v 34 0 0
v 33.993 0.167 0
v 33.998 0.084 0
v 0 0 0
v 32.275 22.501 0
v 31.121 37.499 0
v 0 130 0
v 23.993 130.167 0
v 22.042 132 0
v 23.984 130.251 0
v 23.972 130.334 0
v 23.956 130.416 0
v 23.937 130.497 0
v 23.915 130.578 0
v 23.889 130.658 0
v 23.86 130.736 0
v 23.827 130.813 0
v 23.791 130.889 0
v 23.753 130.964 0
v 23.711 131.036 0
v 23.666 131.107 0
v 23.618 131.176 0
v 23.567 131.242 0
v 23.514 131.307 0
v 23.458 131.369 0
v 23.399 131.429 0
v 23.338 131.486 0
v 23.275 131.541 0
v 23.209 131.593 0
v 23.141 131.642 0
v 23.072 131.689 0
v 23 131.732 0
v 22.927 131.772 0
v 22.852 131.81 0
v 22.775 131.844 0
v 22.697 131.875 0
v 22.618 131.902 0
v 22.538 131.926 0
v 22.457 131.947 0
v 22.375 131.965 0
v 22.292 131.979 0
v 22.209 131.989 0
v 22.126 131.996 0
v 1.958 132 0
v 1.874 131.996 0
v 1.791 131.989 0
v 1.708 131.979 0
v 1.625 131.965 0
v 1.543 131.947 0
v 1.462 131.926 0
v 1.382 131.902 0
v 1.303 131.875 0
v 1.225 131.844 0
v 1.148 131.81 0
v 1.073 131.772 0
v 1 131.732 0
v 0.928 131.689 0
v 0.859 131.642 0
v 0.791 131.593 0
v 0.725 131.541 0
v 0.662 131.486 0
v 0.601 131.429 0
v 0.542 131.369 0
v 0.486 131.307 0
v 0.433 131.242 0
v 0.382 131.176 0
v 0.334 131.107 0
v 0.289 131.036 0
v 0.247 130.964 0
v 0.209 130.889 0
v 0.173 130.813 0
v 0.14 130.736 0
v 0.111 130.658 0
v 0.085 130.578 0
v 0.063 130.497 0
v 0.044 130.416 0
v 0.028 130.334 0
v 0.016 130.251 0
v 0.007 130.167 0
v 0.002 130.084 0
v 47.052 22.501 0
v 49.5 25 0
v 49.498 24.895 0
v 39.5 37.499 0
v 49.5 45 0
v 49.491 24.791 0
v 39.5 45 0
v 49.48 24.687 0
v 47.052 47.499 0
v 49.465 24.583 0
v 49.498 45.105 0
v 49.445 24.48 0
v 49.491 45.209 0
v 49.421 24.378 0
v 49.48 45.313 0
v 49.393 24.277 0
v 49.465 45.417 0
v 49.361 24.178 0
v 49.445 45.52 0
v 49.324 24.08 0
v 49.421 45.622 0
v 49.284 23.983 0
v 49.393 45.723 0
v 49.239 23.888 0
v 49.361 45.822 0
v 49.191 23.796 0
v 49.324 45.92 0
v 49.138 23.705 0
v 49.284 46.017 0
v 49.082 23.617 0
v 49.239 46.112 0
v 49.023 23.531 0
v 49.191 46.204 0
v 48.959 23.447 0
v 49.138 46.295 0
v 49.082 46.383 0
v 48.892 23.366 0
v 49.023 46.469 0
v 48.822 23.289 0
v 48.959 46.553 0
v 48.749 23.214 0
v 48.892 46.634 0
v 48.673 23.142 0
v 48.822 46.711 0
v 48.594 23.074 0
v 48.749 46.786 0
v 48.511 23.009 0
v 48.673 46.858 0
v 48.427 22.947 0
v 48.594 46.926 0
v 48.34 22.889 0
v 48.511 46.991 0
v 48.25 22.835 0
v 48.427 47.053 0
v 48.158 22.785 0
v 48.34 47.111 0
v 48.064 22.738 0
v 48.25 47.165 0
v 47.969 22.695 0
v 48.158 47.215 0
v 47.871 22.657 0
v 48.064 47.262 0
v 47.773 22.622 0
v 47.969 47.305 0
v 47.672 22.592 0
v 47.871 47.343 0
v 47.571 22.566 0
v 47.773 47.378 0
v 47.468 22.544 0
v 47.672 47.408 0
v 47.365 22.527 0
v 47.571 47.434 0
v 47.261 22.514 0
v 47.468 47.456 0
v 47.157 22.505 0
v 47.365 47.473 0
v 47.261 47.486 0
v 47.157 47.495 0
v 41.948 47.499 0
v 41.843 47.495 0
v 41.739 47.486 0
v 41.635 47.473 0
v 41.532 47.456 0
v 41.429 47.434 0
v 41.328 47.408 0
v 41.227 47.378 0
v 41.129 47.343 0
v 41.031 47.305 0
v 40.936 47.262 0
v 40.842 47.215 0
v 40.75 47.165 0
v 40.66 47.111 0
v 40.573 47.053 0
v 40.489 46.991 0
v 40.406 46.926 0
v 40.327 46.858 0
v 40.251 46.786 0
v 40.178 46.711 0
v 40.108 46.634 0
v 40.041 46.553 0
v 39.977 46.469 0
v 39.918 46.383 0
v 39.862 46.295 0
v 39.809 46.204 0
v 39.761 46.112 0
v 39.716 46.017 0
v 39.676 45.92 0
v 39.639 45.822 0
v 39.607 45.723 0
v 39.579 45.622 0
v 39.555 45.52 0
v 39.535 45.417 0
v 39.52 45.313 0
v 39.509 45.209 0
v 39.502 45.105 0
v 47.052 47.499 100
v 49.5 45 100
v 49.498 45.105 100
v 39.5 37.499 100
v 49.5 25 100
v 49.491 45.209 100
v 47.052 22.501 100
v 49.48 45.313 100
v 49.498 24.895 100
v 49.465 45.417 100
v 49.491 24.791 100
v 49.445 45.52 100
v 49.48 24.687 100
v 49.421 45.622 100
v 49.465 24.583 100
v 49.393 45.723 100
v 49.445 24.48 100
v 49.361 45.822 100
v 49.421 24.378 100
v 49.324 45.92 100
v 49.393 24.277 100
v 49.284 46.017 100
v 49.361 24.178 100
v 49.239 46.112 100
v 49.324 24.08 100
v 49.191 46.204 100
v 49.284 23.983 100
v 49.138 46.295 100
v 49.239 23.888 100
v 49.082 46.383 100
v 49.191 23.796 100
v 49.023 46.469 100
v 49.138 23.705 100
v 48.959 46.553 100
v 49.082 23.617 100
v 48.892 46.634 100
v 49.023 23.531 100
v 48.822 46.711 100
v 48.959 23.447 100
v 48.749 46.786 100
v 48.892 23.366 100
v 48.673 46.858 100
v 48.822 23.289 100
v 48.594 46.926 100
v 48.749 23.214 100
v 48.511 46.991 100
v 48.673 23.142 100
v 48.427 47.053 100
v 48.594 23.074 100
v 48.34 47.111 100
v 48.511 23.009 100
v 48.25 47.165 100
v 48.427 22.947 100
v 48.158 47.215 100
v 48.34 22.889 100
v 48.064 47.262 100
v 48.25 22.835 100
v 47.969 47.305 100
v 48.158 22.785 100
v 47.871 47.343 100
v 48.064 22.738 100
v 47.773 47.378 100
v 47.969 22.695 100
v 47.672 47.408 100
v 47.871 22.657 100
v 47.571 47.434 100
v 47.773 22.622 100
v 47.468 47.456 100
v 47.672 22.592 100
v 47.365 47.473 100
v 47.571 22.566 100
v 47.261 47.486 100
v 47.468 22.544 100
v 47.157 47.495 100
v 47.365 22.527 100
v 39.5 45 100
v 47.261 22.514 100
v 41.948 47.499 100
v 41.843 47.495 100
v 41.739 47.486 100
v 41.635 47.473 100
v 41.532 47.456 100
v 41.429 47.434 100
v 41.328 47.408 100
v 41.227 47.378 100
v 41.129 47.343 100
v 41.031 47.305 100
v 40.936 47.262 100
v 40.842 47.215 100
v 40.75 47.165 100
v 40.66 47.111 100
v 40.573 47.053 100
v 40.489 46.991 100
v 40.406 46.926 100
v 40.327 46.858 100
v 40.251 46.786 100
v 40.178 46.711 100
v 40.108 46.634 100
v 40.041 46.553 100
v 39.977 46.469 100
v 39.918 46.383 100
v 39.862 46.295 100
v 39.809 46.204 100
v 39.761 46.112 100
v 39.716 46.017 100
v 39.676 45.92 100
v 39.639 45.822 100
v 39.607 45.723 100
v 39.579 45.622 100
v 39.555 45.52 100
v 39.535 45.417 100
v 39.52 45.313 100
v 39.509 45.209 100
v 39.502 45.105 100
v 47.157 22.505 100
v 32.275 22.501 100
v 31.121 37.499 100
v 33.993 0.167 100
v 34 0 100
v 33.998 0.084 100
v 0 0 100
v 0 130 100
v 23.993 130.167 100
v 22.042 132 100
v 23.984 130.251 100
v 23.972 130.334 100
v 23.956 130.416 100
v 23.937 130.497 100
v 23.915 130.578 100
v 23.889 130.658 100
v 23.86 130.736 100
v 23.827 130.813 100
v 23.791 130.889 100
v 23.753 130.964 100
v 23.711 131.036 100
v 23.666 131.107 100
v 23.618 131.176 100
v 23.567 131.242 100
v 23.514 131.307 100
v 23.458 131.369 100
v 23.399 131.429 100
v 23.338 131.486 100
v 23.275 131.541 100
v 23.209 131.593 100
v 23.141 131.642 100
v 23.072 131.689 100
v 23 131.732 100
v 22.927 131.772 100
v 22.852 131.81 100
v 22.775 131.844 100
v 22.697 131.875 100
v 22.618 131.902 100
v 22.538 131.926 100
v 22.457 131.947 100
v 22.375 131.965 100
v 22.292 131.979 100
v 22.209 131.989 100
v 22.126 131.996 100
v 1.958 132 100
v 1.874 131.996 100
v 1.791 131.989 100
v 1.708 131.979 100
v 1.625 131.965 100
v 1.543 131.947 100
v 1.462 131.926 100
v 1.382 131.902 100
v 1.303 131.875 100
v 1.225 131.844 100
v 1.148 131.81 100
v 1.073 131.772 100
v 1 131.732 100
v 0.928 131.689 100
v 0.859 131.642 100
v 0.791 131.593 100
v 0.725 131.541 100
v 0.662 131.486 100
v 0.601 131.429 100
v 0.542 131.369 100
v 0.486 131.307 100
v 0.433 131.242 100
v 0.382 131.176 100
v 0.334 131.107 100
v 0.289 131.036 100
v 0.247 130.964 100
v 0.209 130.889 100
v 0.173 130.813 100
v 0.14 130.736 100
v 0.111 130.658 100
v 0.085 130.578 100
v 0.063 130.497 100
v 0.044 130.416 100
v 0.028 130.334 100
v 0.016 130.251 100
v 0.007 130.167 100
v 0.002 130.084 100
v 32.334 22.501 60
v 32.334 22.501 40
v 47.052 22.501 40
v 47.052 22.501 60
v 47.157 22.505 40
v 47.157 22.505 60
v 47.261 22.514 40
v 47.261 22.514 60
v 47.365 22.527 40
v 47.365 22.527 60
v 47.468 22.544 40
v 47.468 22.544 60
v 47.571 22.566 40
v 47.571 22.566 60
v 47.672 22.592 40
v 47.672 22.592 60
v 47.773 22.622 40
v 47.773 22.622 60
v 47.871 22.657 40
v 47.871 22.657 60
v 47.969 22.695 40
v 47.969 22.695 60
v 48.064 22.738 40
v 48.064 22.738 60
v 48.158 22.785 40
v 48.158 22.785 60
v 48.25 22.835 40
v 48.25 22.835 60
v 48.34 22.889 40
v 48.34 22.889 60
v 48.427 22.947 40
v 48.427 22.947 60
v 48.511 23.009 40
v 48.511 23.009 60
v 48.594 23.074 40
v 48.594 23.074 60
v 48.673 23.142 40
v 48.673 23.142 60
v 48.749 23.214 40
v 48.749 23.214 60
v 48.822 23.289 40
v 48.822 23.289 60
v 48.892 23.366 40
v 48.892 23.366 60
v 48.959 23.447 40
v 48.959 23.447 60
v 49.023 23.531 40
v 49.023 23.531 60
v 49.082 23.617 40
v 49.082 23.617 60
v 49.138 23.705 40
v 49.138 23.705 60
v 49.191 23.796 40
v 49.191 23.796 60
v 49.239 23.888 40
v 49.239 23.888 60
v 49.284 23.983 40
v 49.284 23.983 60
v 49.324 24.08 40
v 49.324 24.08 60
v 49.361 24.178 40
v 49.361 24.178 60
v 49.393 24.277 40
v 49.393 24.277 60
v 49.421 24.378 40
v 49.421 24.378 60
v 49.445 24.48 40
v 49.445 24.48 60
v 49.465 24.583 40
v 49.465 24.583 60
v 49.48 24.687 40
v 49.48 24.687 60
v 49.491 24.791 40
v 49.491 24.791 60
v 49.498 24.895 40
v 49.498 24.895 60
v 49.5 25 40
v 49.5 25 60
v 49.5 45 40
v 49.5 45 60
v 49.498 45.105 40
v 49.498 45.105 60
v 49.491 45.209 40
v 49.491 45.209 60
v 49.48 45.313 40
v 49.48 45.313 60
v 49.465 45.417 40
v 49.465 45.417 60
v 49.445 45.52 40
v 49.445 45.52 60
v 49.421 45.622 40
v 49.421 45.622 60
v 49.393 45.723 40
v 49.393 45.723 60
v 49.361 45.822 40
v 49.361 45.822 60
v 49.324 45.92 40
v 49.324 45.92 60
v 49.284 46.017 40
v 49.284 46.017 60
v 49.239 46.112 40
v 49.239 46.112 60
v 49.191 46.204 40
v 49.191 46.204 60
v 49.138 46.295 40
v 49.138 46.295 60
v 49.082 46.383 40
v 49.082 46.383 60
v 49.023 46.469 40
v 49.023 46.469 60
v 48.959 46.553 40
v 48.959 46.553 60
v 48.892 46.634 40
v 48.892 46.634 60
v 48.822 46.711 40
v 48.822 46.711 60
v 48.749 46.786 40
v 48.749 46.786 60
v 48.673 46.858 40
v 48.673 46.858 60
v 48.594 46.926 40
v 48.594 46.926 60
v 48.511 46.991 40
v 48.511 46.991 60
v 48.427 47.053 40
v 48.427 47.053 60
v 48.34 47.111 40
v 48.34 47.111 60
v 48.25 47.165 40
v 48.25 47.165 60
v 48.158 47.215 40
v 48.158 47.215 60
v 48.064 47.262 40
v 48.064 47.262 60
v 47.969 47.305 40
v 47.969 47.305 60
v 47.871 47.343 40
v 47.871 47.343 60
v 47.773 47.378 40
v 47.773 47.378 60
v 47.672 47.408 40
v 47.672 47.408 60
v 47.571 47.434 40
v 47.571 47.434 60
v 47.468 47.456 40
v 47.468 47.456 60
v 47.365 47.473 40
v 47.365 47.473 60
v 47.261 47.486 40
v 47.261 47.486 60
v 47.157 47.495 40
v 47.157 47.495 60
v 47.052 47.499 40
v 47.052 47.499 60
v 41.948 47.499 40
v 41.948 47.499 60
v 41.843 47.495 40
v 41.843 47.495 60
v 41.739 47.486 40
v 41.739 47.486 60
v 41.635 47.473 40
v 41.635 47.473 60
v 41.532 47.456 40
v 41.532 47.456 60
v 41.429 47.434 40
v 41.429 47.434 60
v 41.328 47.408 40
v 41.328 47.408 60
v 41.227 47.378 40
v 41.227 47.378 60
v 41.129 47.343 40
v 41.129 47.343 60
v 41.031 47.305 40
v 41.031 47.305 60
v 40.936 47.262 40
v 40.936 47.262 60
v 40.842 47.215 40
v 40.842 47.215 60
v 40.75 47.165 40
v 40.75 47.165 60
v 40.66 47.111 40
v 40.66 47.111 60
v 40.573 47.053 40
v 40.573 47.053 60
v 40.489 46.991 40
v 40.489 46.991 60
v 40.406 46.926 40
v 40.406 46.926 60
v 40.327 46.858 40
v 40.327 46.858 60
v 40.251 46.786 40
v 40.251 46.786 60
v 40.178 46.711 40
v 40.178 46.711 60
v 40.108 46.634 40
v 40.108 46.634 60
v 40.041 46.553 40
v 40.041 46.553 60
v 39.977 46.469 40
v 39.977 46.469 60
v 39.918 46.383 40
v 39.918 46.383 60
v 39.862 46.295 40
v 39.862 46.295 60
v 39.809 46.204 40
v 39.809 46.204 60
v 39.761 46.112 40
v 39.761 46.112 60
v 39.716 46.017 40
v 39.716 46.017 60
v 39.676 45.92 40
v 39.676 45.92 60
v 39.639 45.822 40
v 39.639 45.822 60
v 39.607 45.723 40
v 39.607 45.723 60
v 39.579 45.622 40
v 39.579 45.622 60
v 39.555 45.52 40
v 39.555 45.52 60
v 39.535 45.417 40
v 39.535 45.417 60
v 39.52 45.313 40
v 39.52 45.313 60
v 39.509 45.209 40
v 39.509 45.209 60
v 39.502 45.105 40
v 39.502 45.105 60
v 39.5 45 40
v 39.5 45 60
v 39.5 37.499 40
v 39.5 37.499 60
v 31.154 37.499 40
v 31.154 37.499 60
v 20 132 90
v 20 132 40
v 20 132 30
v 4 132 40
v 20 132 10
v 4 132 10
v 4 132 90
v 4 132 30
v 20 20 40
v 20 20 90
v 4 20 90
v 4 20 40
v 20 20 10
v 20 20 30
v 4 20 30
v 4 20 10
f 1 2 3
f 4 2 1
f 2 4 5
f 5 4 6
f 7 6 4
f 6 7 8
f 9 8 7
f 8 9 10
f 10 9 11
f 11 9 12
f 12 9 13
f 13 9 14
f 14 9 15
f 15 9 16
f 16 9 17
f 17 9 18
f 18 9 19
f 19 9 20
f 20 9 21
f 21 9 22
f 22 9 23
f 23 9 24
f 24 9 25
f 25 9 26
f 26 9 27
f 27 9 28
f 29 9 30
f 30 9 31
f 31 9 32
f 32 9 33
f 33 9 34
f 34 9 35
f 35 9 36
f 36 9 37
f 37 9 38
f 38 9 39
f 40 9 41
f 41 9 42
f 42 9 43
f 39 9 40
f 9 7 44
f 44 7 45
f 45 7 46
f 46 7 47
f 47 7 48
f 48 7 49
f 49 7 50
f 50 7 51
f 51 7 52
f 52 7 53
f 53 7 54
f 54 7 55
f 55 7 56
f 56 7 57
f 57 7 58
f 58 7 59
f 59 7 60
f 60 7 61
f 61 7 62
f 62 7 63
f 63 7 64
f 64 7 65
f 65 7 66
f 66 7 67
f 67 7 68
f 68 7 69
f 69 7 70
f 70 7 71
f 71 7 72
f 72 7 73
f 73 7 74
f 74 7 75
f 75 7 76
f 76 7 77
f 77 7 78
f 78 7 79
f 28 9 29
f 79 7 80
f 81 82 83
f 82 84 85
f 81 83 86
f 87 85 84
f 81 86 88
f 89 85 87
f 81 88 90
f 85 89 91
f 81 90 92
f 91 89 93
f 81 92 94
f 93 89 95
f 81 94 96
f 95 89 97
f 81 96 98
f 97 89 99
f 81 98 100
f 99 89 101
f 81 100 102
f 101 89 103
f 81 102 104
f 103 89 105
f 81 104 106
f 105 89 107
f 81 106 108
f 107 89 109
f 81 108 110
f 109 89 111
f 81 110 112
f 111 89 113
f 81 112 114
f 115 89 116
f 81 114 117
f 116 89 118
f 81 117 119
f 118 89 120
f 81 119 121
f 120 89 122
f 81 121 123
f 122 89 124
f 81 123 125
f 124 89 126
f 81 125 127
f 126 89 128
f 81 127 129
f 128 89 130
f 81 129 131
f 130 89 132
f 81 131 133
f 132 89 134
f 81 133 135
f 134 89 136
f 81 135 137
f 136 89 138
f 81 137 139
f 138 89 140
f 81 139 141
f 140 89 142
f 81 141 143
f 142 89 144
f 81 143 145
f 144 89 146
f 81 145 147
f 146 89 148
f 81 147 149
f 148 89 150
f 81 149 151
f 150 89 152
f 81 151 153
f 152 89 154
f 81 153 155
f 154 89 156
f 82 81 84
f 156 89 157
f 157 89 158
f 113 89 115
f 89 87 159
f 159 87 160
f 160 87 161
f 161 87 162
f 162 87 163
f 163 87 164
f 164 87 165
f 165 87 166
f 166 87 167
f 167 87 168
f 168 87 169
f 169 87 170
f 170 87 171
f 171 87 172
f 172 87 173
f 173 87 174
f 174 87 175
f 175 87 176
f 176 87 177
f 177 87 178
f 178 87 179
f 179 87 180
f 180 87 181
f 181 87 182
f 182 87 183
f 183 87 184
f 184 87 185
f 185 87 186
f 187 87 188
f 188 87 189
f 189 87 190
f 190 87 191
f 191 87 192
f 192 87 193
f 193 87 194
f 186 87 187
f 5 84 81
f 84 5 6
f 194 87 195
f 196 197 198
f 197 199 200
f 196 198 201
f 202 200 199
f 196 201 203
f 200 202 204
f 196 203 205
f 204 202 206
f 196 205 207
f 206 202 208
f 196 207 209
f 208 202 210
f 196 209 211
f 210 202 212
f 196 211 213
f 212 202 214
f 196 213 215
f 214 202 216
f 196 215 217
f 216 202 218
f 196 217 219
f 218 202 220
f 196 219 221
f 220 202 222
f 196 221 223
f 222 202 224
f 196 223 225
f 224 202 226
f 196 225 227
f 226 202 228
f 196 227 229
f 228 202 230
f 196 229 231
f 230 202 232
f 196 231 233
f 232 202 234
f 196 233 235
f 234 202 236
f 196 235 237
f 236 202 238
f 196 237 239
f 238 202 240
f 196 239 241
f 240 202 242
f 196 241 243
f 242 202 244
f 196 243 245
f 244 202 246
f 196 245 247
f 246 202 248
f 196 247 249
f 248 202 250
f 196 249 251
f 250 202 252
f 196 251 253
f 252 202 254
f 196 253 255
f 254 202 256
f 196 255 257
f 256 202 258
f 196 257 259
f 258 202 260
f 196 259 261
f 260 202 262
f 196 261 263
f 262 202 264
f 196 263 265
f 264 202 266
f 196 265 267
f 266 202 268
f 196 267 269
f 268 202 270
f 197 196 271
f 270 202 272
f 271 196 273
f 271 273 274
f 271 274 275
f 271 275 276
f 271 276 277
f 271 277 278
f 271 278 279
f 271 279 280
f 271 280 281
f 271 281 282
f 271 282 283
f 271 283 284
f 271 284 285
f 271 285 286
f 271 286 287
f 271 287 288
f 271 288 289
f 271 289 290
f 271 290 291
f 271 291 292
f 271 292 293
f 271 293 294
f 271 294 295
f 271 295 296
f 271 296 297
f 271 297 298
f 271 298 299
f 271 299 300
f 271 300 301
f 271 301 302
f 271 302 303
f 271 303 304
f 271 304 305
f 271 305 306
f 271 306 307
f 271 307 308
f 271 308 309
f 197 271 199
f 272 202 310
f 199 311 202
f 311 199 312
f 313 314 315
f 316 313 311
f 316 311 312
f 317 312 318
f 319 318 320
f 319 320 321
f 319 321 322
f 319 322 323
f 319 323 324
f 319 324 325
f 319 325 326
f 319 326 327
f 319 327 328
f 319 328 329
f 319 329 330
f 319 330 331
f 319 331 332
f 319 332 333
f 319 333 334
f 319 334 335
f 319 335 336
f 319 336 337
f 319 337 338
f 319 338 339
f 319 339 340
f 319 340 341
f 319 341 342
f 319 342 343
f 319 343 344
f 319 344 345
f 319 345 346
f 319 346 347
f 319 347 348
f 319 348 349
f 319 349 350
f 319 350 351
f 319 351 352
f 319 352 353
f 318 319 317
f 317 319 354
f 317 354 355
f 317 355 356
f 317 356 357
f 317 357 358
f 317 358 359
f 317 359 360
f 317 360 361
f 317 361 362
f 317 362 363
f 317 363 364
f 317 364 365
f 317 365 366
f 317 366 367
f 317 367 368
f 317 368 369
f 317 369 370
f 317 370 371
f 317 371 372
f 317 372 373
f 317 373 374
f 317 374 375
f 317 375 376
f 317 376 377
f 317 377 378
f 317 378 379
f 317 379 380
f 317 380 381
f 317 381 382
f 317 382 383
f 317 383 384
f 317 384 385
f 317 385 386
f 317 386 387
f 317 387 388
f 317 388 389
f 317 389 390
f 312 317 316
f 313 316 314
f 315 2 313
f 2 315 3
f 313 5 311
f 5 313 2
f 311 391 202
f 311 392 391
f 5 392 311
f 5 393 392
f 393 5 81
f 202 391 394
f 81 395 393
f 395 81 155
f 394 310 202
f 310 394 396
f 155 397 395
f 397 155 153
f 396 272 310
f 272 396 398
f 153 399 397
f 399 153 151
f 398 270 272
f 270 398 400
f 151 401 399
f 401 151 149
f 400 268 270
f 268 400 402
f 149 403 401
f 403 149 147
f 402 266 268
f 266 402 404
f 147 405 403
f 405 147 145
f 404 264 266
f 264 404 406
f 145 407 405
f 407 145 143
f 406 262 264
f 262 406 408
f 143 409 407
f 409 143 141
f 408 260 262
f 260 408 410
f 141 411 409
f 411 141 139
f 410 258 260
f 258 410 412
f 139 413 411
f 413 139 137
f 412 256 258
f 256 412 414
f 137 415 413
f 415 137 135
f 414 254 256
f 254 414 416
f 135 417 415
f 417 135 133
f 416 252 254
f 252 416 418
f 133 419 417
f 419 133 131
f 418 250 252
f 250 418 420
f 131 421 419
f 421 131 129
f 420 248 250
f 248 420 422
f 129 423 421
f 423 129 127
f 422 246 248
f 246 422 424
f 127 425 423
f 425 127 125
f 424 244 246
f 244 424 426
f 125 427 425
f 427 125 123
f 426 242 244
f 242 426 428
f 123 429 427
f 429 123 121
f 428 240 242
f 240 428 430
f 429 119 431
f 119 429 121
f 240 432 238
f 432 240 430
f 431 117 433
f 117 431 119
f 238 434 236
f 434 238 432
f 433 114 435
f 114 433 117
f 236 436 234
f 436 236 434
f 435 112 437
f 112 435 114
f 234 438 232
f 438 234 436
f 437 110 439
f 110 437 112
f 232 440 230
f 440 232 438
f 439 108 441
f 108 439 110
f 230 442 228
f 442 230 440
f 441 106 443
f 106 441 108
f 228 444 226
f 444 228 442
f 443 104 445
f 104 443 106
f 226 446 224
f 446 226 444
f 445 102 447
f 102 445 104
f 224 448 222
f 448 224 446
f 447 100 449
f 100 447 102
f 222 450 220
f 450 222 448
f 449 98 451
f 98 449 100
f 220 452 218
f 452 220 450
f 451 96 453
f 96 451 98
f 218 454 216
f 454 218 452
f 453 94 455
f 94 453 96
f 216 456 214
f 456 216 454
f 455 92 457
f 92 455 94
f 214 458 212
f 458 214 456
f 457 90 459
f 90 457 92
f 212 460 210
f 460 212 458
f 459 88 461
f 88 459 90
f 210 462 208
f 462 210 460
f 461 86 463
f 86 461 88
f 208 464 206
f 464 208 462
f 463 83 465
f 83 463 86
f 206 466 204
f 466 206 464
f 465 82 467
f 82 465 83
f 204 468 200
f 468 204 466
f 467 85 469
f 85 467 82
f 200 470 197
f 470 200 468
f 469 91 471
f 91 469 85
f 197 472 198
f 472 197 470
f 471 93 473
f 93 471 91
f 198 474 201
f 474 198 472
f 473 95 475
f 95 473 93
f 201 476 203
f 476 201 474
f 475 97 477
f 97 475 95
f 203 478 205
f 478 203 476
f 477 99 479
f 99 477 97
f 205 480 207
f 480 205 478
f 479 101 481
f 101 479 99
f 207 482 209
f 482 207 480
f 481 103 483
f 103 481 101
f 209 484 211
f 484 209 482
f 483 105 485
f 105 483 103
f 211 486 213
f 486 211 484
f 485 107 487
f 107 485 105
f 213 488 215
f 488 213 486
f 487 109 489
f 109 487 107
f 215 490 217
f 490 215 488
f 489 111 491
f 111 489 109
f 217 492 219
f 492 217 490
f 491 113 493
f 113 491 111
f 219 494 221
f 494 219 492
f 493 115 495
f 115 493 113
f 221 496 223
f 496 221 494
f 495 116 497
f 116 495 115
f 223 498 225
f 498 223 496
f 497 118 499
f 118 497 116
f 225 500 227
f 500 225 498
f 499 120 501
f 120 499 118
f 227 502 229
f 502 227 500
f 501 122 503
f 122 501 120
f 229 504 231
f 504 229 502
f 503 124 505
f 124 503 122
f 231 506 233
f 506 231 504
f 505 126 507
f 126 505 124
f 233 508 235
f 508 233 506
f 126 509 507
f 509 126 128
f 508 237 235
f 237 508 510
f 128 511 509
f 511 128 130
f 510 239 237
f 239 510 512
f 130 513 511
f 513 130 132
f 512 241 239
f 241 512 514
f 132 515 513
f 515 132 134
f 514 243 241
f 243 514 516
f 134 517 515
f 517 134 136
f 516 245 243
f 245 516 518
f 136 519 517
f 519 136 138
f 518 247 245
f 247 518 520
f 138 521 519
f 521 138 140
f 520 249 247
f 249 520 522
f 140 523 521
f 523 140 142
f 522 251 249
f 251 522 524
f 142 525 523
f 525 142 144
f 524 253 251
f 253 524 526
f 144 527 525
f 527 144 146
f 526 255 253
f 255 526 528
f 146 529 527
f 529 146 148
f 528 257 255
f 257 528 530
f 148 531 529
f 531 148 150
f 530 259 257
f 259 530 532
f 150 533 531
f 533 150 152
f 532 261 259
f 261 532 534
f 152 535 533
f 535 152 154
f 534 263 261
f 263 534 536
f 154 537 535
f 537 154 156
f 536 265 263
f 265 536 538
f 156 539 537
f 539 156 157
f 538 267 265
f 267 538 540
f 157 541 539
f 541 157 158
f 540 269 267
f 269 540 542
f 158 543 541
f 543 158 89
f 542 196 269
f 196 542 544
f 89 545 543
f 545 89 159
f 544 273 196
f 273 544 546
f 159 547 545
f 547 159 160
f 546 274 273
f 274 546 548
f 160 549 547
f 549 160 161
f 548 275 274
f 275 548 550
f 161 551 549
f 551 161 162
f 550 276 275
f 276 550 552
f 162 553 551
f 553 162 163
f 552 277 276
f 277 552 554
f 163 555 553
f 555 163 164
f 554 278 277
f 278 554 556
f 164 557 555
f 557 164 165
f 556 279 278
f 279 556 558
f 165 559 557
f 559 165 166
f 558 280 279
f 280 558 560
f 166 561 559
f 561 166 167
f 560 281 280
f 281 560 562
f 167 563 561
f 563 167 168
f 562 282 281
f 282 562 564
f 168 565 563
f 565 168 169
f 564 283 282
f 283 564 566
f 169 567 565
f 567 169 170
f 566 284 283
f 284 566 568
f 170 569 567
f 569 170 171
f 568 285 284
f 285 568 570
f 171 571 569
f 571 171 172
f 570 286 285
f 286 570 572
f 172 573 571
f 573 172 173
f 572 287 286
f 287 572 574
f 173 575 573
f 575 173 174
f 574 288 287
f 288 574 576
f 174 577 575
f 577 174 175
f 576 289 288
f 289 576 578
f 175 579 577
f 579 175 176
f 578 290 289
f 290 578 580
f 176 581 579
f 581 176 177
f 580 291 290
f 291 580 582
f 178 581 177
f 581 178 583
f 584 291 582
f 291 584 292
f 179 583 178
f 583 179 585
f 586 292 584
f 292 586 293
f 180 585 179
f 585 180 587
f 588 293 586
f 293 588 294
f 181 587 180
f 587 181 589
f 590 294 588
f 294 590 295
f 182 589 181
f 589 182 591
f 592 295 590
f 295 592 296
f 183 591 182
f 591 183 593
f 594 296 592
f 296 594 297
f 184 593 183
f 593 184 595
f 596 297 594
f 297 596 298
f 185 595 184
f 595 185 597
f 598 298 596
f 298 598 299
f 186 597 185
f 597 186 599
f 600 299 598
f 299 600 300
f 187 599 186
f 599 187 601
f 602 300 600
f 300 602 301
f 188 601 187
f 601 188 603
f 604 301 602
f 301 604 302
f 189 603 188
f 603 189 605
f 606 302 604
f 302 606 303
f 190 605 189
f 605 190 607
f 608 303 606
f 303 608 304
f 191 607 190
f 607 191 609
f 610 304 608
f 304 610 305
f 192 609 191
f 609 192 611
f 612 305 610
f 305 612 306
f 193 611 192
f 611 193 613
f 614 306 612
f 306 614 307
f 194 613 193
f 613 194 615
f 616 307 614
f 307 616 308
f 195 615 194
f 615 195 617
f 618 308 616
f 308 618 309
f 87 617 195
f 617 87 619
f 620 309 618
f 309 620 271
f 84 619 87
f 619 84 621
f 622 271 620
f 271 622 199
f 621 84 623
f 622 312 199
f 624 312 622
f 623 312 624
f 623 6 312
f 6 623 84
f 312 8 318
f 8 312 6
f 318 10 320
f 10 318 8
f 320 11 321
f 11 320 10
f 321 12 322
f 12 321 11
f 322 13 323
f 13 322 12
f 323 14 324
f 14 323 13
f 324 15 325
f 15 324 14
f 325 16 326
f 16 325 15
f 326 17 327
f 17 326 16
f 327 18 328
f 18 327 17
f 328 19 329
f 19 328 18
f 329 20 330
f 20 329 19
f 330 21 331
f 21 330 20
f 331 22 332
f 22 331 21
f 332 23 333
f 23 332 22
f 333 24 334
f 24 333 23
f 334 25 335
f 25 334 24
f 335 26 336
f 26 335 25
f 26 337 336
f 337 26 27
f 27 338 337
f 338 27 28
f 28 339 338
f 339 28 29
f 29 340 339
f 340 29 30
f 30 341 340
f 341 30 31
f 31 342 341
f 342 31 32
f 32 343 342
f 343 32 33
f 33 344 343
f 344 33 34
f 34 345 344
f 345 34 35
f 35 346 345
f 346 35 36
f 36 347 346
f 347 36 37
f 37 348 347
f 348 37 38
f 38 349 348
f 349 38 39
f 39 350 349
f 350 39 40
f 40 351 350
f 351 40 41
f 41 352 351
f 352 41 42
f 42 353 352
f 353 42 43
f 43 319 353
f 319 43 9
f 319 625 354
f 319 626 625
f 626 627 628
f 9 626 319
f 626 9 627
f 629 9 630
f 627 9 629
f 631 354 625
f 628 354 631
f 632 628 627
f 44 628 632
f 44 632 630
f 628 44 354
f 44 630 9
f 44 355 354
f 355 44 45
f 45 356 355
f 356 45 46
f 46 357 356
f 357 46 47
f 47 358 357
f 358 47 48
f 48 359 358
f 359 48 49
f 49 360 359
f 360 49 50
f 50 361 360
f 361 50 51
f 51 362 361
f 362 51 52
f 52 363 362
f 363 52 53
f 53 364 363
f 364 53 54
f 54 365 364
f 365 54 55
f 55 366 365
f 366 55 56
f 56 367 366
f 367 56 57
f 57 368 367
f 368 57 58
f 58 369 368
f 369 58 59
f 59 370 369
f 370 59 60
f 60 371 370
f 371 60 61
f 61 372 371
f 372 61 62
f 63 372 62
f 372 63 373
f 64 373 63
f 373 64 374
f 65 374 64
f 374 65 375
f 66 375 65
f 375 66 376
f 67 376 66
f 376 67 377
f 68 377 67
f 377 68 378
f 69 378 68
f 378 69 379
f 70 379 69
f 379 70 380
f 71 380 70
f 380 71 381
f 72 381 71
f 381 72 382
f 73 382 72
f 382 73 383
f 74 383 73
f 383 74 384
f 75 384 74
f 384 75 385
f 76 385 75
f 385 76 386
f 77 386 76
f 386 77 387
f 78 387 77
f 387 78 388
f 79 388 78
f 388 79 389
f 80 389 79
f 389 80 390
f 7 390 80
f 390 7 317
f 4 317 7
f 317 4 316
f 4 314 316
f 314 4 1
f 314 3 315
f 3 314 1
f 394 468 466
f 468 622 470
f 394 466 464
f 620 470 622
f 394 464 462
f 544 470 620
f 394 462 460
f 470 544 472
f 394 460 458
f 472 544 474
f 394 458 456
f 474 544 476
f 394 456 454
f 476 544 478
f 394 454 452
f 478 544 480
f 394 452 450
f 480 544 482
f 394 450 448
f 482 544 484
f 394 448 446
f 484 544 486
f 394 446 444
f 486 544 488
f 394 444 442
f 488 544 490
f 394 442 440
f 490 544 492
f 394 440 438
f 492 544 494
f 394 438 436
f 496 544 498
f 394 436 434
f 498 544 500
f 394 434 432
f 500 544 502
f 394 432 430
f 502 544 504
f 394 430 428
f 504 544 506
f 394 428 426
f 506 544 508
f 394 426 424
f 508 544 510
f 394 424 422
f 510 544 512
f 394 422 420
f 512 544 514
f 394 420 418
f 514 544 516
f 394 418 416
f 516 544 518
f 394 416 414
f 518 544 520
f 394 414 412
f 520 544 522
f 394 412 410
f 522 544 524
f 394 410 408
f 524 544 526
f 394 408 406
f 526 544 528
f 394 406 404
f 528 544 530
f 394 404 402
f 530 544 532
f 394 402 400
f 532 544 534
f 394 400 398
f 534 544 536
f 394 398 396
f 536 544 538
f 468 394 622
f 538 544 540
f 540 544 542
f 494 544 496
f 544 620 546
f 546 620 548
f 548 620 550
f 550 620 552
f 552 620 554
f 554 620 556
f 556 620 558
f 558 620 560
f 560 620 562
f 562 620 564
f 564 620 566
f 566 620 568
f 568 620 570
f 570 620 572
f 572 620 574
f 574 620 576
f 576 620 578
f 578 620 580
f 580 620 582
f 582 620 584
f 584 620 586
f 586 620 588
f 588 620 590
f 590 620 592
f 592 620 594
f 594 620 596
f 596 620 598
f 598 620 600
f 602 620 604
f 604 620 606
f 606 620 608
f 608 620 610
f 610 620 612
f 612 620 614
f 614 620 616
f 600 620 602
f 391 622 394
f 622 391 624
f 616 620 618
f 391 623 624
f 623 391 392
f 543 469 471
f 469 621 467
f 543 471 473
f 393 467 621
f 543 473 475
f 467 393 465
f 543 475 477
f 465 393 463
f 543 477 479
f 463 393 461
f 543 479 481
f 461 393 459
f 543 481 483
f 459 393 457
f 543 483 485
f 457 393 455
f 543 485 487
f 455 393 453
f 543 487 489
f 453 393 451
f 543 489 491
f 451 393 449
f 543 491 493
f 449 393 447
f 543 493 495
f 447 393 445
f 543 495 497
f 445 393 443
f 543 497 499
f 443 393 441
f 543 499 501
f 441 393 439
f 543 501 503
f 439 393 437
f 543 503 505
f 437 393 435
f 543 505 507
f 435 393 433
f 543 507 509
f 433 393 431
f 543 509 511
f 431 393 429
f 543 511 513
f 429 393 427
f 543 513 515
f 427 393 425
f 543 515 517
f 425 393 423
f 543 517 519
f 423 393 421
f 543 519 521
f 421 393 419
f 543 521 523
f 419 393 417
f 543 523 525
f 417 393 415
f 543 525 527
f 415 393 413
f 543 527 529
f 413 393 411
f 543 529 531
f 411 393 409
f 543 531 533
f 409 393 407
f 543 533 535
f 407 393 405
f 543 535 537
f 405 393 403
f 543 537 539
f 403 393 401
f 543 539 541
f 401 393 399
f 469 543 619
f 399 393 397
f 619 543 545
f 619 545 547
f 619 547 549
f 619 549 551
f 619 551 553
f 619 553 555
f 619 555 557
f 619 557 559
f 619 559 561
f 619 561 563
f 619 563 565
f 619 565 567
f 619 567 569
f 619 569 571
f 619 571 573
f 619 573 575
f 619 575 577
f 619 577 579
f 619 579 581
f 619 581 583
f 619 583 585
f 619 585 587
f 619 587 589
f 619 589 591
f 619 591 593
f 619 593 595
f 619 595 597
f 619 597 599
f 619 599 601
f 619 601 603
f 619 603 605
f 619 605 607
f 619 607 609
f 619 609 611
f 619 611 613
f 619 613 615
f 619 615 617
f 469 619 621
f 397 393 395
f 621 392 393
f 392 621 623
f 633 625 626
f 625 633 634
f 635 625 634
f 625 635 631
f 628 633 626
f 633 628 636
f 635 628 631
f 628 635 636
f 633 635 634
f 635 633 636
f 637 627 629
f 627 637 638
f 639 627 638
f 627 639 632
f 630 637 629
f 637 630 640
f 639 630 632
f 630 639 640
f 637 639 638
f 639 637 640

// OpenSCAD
$fn=150;

difference()
{
    translate([2,0,0])
        base_stand();
    color("red")
        rotate([0,0,4.5])
            translate([34,0,40])
                cube([40,50,20]);
    color("green")
        translate([4,20,40])
            cube([16,140,50]);
    color("green")
        translate([4,20,10])
            cube([16,140,20]);
}

module base_stand()
{
    linear_extrude(height=100)
    {   
        difference()
        {
            minkowski()
            {
                polygon(points = [[0,0],[30,0],[20,130],[0,130]],paths=[[0,1,2,3]]);
                circle(d=4);
            }
            translate([-4,-5,0])
                square([40,5]);
        }
        minkowski()
        {
            union()
            {
            color("red")
                translate([20, 25,0])
                    square([25,10]);
            color("green")
                translate([40, 25,0])
                    square([5,20]);
            }
            circle(d=5);
        }
    }
}
